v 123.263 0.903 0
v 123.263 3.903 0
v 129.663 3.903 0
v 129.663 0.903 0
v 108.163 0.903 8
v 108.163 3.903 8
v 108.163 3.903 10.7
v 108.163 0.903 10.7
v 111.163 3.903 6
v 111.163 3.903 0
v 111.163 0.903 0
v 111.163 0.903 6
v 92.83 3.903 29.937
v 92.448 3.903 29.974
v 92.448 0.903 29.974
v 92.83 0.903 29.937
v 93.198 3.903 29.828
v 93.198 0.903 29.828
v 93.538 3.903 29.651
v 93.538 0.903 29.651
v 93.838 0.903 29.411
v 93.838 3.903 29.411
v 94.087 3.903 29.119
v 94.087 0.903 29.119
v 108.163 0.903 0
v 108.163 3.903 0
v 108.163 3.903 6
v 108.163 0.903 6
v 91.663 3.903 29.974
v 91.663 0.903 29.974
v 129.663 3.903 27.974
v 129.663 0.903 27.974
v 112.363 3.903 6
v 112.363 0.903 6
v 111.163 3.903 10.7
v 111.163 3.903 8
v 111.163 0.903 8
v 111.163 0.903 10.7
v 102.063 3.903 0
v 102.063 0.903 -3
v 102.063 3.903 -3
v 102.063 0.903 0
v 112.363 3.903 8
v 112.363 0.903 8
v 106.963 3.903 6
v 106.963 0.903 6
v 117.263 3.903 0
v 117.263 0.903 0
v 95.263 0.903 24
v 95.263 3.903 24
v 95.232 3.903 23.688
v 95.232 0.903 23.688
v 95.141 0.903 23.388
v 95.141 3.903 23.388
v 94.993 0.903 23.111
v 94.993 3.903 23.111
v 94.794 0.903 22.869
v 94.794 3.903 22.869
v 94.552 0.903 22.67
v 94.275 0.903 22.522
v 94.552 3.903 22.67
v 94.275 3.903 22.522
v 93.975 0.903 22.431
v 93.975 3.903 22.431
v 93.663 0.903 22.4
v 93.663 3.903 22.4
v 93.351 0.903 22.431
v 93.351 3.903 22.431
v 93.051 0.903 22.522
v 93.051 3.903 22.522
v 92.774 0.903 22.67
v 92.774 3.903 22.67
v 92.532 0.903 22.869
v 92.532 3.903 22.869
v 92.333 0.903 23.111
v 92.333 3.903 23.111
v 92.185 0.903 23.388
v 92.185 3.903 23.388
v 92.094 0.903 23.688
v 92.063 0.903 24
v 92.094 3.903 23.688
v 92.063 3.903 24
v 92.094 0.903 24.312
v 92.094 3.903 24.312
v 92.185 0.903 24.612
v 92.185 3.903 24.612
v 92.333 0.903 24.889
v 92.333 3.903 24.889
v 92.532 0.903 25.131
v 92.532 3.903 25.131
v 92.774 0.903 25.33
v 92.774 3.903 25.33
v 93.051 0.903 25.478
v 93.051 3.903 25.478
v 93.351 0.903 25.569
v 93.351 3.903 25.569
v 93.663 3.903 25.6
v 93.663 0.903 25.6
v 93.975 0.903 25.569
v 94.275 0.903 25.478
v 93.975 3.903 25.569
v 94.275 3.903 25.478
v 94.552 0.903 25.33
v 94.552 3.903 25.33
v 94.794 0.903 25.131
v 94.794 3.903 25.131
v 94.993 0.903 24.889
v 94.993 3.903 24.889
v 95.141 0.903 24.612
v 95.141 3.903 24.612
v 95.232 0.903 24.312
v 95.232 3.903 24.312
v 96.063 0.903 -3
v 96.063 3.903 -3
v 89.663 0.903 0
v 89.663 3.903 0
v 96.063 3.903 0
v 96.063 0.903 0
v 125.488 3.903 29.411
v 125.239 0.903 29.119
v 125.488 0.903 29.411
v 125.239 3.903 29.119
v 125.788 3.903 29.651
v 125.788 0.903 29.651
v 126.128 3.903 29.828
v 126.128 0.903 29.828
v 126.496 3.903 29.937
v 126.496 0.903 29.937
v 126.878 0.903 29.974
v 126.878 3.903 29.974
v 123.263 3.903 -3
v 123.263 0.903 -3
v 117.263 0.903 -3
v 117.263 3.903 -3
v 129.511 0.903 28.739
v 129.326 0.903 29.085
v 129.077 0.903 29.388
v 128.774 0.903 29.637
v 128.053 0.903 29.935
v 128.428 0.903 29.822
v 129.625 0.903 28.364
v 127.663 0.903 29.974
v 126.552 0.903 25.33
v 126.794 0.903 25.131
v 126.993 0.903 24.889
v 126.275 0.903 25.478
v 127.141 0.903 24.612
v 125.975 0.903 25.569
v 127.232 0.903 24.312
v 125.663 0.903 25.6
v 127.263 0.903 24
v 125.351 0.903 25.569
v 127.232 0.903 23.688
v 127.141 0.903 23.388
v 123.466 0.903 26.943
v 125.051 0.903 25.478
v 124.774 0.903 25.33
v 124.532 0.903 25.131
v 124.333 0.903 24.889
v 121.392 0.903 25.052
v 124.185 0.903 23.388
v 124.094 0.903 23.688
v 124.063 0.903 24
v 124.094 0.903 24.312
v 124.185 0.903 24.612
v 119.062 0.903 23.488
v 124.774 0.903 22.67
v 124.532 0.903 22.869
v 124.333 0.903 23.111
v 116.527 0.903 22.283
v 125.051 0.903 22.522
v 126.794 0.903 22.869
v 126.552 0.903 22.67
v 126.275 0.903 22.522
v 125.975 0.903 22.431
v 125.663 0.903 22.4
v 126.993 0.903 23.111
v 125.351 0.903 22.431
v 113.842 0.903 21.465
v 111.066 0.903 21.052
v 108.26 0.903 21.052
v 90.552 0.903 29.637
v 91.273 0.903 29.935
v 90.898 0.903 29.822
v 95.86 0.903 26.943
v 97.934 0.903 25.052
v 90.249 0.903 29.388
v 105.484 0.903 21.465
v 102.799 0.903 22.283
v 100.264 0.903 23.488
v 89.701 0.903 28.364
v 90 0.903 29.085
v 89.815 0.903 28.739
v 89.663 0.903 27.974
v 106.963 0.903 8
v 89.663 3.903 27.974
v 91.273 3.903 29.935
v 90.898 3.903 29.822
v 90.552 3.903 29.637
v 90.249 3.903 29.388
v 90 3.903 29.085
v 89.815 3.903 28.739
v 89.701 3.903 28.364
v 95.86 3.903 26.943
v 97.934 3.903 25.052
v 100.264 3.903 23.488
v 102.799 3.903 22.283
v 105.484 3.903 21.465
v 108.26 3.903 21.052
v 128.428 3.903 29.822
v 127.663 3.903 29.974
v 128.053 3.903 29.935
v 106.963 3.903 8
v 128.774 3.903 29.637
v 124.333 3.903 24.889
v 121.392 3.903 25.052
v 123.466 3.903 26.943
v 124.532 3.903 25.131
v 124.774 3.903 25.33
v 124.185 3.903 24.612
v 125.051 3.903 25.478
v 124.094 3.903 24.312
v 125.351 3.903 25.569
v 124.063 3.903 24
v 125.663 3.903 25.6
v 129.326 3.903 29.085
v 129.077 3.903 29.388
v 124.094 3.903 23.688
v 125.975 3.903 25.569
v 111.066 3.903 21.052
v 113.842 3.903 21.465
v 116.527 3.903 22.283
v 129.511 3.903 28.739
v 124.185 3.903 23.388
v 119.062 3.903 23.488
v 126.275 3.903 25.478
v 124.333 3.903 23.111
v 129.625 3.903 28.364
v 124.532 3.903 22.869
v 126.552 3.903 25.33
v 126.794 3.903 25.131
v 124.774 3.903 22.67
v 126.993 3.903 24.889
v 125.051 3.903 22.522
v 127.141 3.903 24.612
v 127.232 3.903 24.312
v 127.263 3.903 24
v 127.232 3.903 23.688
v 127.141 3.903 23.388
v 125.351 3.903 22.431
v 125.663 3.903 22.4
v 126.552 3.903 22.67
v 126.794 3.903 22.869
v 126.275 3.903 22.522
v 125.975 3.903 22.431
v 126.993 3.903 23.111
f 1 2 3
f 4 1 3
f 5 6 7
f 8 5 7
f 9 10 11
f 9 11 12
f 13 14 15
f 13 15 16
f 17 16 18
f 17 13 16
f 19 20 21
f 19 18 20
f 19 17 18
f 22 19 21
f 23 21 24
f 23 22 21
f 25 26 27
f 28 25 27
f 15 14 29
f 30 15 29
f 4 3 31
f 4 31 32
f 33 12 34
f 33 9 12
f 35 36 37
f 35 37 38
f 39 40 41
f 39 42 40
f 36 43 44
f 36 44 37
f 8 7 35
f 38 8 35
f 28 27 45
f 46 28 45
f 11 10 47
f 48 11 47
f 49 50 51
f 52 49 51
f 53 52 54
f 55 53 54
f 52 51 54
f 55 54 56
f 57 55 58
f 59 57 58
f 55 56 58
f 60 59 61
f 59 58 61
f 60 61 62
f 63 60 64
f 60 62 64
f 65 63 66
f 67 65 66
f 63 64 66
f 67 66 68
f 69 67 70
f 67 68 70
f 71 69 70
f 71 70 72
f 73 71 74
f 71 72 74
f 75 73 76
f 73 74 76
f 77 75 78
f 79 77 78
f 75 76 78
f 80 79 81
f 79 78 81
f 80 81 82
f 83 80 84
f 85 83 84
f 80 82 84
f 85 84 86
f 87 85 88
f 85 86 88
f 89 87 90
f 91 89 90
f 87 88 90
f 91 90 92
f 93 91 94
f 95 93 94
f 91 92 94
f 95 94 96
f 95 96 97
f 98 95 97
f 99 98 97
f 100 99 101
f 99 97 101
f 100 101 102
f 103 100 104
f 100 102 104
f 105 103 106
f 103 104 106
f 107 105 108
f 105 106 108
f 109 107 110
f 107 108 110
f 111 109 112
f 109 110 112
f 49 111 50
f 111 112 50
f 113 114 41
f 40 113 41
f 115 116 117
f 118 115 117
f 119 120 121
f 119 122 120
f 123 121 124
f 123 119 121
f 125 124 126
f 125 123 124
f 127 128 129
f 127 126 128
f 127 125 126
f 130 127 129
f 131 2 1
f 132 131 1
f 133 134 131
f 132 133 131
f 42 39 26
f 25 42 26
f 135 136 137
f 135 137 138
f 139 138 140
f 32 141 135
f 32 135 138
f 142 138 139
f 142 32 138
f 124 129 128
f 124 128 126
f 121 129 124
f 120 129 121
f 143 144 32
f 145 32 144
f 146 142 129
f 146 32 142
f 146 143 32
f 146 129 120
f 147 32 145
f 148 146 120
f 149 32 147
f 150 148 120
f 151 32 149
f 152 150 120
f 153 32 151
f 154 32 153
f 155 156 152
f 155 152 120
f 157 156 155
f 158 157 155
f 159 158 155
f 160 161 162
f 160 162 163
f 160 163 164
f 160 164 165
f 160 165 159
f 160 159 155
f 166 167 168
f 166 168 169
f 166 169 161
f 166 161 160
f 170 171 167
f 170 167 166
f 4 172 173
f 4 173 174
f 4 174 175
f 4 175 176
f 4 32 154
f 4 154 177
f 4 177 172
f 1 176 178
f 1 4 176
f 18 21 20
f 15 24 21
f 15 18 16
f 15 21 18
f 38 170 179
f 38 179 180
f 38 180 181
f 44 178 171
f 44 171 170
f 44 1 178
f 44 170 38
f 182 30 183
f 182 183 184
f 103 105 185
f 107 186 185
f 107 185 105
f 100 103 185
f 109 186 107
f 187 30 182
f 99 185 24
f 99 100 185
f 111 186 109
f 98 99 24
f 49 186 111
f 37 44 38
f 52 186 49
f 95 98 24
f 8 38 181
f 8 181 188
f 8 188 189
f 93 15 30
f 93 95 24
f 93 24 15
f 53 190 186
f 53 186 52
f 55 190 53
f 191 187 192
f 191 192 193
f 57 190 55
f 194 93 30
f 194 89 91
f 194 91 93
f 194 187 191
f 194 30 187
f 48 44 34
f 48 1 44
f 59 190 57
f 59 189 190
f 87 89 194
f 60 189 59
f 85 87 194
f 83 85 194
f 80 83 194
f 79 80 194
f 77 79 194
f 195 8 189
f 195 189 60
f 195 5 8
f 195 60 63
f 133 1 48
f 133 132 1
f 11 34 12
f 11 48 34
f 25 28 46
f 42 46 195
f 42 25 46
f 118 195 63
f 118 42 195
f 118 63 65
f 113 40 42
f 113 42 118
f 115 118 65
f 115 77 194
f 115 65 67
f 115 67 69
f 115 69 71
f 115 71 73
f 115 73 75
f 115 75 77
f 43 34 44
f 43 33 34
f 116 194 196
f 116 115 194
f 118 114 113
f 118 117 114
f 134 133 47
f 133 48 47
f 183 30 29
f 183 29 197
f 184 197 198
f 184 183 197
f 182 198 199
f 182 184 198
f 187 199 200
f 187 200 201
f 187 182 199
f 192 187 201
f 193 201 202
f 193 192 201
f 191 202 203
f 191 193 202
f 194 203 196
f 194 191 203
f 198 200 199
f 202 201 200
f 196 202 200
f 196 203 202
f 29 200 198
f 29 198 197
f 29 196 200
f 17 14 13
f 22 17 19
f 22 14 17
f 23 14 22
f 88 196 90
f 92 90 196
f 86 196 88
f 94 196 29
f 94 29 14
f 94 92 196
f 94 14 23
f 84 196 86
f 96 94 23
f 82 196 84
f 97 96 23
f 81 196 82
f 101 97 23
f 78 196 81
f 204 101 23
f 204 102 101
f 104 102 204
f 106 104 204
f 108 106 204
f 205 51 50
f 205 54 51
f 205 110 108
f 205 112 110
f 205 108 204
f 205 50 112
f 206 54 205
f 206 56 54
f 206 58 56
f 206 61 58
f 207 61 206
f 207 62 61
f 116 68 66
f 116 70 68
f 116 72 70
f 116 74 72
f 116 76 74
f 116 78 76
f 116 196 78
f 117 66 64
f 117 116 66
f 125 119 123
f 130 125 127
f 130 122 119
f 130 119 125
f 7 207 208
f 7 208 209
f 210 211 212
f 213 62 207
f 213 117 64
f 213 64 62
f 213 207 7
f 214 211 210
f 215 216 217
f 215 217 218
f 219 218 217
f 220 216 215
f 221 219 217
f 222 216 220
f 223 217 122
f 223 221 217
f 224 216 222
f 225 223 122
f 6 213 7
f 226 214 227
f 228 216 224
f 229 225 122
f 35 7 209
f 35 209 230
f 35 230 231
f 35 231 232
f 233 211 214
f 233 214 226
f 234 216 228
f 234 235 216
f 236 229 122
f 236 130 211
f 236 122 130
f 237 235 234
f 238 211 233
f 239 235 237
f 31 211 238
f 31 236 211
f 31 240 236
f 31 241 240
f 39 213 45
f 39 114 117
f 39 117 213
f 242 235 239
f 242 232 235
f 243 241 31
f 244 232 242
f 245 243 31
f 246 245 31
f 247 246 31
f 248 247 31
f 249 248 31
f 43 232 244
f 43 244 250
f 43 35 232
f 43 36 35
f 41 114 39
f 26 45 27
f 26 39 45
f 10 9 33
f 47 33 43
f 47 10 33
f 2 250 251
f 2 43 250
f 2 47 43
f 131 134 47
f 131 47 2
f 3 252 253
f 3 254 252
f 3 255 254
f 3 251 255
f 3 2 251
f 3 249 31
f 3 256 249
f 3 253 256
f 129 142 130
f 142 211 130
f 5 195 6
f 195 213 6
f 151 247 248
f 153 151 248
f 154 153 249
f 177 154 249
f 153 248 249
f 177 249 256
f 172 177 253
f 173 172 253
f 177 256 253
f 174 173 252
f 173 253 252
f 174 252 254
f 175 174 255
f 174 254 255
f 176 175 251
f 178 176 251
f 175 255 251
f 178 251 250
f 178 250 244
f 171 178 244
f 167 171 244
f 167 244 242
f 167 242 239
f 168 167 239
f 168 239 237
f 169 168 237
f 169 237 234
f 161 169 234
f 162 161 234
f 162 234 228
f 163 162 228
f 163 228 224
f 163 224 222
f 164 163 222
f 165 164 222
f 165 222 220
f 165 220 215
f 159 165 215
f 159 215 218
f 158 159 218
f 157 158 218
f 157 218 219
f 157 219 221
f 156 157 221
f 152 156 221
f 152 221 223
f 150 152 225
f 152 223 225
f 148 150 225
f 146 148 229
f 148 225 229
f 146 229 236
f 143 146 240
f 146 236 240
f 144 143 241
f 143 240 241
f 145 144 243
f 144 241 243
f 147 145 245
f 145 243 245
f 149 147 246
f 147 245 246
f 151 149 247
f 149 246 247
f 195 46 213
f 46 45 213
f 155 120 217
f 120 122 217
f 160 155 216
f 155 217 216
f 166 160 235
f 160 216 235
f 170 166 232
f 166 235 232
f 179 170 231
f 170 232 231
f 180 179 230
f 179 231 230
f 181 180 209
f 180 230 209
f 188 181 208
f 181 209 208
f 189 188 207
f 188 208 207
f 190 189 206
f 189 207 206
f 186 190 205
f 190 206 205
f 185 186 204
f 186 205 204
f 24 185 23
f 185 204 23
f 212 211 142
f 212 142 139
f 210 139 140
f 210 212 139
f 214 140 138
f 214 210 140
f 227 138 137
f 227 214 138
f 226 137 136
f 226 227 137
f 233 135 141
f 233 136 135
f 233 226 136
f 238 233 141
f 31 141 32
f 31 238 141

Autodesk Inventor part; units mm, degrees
ref_plane "YZ Plane" through (0, 0, 0) normal (1, 0, 0) x (0, 1, 0)
ref_plane "XZ Plane" through (0, 0, 0) normal (0, 1, 0) x (-1, 0, 0)
ref_plane "XY Plane" through (0, 0, 0) normal (0, 0, 1) x (1, 0, 0)
ref_plane "Work Plane1" through (0, 0, 0) normal (0, 0, 1) x (1, 0, 0)
sketch "Sketch1" plane through (0, 0, 0) normal (0, 0, 1) x (1, 0, 0)
  line L0 (96.063, 0.903) -> (102.063, 0.903)
  line L1 (102.063, 0.903) -> (102.063, 3.903)
  line L2 (102.063, 3.903) -> (96.063, 3.903)
  line L3 (96.063, 3.903) -> (96.063, 0.903)
  line L4 (96.063, 0.903) -> (102.063, 3.903) construction
  line L5 (102.063, 0.903) -> (96.063, 3.903) construction
  line L6 (117.163, 0.353) -> (117.163, 4.453) projected
  line L7 (123.363, 4.453) -> (123.363, 0.353) projected
  line L8 (117.163, 2.403) -> (123.363, 2.403)
  line L9 (117.263, 3.903) -> (123.263, 3.903)
  line L10 (123.263, 3.903) -> (123.263, 0.903)
  line L11 (123.263, 0.903) -> (117.263, 0.903)
  line L12 (117.263, 0.903) -> (117.263, 3.903)
  line L13 (117.263, 3.903) -> (123.263, 0.903) construction
  line L14 (123.263, 3.903) -> (117.263, 0.903) construction
  point P0 (0, 0)
  point P1 (99.063, 2.403)
  point P2 (120.263, 2.403)
  dimension "d0" = 6
  dimension "d1" = 3
  dimension "d2" = 6
  dimension "d3" = 3
extrude "Extrusion1" add sketch "Sketch1" against normal blind 3
sketch "Sketch2" plane through (0, 0, 0) normal (0, 0, 1) x (1, 0, 0)
  line L0 (96.063, 0.903) -> (102.063, 0.903) projected
  line L1 (102.063, 0.903) -> (102.063, 3.903) projected
  line L2 (102.063, 3.903) -> (96.063, 3.903) projected
  line L3 (96.063, 3.903) -> (96.063, 0.903) projected
  line L4 (117.263, 3.903) -> (123.263, 3.903) projected
  line L5 (117.263, 0.903) -> (117.263, 3.903) projected
  line L6 (123.263, 0.903) -> (117.263, 0.903) projected
  line L7 (123.263, 3.903) -> (123.263, 0.903) projected
  point P0 (0, 0)
sketch "Sketch3" plane through (0, 0, 0) normal (0, 0, 1) x (1, 0, 0)
  line L0 (89.663, 3.903) -> (129.663, 3.903)
  line L1 (129.663, 3.903) -> (129.663, 0.903)
  line L2 (129.663, 0.903) -> (89.663, 0.903)
  line L3 (89.663, 0.903) -> (89.663, 3.903)
  line L4 (89.663, 3.903) -> (129.663, 0.903) construction
  line L5 (129.663, 3.903) -> (89.663, 0.903) construction
  point P0 (0, 0)
  point P1 (109.663, 2.403)
  dimension "d6" = 40
  dimension "d7" = 3
extrude "Extrusion2" add sketch "Sketch3" along normal blind 60
sketch "Sketch4" plane through (96.063, 3.903, -3) normal (0, 1, 0) x (1, 0, 0)
  line L0 (-6.4, -63) -> (33.6, -63) projected
  line L1 (33.6, -3) -> (33.6, -63) projected
  line L2 (-6.4, -63) -> (33.6, -63)
  line L3 (33.6, -63) -> (33.6, -23)
  line L4 (33.6, -23) -> (-6.4, -23)
  line L5 (-6.4, -23) -> (-6.4, -63)
  circle A0 centre (13.6, -43) radius 19
  line L6 (13.6, -43) -> (13.6, -27)
  line L7 (13.6, -27) -> (-2.4, -27)
  circle A1 centre (-2.4, -27) radius 1.6
  circle A2 centre (29.6, -27) radius 1.6
  line L8 (13.6, -43) -> (17.3038, -43)
  circle A3 centre (-2.4, -59) radius 1.6
  circle A4 centre (29.6, -59) radius 1.6
  point P0 (-96.063, -3)
  dimension "d10" = 40
  dimension "d11" = 38
  dimension "d12" = 16
  dimension "d13" = 16
  dimension "d14" = 3.2
extrude "Extrusion3" cut sketch "Sketch4" against normal through all contours A0 | A1 | A2 | A3 | A4
fillet "Fillet1" radius 2 2 edges at (89.663, 2.403, 60) (129.663, 2.403, 60)
sketch "Sketch5" plane through (117.263, 3.903, -3) normal (0, 1, 0) x (1, 0, 0)
  line L0 (-41.845, -71.0861) -> (34.1344, -71.0861)
  line L1 (34.1344, -71.0861) -> (34.1344, -32.9739)
  line L2 (34.1344, -32.9739) -> (-41.845, -32.9739)
  line L3 (-41.845, -32.9739) -> (-41.845, -71.0861)
  point P0 (-117.263, -3)
extrude "Extrusion4" cut sketch "Sketch5" against normal blind 40
fillet "Fillet2" radius 2 4 edges at (125.8023, 2.403, 29.9739) (93.5237, 2.403, 29.9739) (129.663, 2.403, 29.9739) (89.663, 2.403, 29.9739)
sketch "Sketch6" plane through (117.263, 3.903, -3) normal (0, 1, 0) x (1, 0, 0)
  line L0 (-9.2, 0) -> (-9.2, -3)
  line L1 (-6, 0) -> (-6, -3)
  line L2 (38.3326, -3) -> (-143.1956, -3) projected
  line L3 (0, -3) -> (-15.2, -3) projected
  line L4 (-7.6, -3) -> (-6.1, -3)
  line L5 (-6.1, -13.7) -> (-7.6, -13.7)
  line L6 (-7.6, -3) -> (-9.1, -3)
  line L7 (-9.1, -13.7) -> (-7.6, -13.7)
  line L8 (-9.1, -3) -> (-9.1, -9)
  line L9 (-9.1, -9) -> (-10.3, -9)
  line L10 (-10.3, -9) -> (-10.3, -11)
  line L11 (-10.3, -11) -> (-9.1, -11)
  line L12 (-9.1, -3) -> (-9.1, -9)
  line L13 (-9.1, -11) -> (-9.1, -13.7)
  line L14 (-7.6, -3) -> (-7.6, -5.4805)
  line L15 (-6.1, -3) -> (-6.1, -9)
  line L16 (-6.1, -9) -> (-4.9, -9)
  line L17 (-4.9, -9) -> (-4.9, -11)
  line L18 (-4.9, -11) -> (-6.1, -11)
  line L19 (-6.1, -11) -> (-6.1, -13.7)
  point P0 (-117.263, -3)
  dimension "d21" = 1.5
  dimension "d22" = 10.7
  dimension "d23" = 1.5
  dimension "d24" = 6
  dimension "d25" = 1.2
  dimension "d26" = 2
extrude "Extrusion5" cut sketch "Sketch6" against normal through all
sketch "Sketch7" plane through (0, 0, -3) normal (0, 0, -1) x (-1, 0, 0)
  point P0 (0, 0)
  point P1 (-109.663, 2.403)
properties part number "Fanmount_CPY1_CPY_CPY" material "Acetal Resin, Black"
